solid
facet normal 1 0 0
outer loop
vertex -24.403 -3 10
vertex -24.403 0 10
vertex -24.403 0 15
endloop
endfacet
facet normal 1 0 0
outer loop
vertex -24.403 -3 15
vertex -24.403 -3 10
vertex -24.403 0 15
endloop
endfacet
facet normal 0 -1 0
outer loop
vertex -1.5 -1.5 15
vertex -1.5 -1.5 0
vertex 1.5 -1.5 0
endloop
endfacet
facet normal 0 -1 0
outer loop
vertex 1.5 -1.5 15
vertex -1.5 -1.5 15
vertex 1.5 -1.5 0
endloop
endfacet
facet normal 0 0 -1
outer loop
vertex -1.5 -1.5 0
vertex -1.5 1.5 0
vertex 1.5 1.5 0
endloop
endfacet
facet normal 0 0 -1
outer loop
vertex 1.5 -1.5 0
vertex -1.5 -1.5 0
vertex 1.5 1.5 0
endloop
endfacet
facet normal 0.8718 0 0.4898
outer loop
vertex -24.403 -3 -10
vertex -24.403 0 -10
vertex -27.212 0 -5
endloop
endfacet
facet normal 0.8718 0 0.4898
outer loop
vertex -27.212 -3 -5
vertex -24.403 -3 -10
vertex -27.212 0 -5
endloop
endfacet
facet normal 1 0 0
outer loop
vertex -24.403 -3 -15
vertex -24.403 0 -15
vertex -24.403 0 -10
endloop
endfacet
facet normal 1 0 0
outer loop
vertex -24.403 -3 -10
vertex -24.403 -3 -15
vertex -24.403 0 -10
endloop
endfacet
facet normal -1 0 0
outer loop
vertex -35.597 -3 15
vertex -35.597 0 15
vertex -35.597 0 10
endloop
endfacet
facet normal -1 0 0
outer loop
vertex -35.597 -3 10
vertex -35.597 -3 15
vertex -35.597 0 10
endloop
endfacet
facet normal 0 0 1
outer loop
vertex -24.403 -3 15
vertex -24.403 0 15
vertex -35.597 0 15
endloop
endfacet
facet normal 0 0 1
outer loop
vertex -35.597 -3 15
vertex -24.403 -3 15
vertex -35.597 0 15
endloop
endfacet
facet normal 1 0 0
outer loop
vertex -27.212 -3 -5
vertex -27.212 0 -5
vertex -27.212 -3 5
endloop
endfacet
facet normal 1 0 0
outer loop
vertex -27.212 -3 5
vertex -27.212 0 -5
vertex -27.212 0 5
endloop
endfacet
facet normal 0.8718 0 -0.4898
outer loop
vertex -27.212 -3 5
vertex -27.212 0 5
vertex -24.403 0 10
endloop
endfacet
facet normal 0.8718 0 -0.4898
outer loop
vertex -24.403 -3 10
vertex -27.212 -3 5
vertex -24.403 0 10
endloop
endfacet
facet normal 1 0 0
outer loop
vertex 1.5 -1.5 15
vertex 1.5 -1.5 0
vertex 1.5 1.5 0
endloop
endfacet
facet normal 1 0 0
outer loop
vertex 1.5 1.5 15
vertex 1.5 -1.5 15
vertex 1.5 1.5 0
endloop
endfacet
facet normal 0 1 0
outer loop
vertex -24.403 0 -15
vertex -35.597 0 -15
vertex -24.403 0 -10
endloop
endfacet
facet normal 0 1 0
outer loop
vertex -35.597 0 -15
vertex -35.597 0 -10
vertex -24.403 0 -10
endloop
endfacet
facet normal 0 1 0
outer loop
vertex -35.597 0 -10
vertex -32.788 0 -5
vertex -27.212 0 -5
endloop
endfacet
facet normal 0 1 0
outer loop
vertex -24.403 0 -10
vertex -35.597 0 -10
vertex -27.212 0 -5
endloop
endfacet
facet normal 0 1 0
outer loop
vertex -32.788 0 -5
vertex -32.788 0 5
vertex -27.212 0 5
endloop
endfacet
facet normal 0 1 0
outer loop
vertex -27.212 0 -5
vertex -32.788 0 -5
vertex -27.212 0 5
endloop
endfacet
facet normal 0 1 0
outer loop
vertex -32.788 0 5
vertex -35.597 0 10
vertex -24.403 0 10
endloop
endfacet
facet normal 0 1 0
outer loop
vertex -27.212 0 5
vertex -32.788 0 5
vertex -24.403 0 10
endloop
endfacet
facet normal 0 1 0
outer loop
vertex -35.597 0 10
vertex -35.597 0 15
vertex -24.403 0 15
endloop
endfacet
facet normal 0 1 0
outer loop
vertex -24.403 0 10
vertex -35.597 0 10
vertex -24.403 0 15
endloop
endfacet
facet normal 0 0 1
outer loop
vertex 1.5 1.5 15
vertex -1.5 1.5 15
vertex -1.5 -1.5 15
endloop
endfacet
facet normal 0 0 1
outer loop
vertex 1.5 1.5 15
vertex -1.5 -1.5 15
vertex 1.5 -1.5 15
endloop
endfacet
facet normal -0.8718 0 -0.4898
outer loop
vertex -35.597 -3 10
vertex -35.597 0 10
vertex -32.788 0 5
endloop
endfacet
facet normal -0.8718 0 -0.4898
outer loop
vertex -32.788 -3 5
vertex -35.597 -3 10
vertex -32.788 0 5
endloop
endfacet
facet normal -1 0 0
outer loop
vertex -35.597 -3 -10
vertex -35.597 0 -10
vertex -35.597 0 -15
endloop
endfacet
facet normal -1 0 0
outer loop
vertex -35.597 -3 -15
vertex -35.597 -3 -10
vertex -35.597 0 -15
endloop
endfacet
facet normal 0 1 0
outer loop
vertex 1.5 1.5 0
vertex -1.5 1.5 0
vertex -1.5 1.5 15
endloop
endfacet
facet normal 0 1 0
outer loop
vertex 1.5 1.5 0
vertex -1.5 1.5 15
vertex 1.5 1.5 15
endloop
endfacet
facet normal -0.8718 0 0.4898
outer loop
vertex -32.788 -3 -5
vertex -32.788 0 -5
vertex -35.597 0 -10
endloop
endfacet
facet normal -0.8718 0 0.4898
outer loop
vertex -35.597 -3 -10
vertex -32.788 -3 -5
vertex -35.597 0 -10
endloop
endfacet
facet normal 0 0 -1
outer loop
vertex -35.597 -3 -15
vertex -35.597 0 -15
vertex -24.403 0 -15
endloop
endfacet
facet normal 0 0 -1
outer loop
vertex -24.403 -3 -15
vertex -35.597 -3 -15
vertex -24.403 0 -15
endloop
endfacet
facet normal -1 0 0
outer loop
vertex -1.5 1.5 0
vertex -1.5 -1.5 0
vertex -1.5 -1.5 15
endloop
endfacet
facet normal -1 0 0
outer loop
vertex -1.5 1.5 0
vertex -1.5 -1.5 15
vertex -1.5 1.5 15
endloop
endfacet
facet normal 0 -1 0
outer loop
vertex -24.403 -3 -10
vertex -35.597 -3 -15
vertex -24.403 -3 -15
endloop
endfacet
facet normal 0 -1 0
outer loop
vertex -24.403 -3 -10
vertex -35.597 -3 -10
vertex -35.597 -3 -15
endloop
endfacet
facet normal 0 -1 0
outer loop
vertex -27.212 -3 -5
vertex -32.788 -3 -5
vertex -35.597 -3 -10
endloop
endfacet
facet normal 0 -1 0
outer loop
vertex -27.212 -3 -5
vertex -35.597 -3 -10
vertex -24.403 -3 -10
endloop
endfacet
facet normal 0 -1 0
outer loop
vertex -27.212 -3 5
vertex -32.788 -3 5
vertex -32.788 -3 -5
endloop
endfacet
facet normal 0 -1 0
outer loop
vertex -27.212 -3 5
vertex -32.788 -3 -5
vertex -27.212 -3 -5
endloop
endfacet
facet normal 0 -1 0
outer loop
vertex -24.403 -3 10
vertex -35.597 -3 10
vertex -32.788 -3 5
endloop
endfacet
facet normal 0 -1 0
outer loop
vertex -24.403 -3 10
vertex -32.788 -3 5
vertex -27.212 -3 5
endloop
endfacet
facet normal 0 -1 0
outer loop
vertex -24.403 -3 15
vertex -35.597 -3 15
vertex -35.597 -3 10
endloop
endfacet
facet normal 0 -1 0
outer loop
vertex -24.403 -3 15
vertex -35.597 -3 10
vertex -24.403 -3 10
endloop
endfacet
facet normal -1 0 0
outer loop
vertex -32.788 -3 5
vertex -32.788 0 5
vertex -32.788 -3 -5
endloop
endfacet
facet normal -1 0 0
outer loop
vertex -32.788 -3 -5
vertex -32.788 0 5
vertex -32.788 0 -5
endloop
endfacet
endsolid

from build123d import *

# Parameters (mm, degrees)
F0_W     = 3
F0_H     = 3
F1_DEPTH = 15
F3_DEPTH = 3


with BuildPart() as f1:
    # F0 (on Top) → F1 (new body)
    with BuildSketch(Plane.XY):
        Rectangle(F0_W, F0_H)
    extrude(amount=F1_DEPTH)


with BuildPart() as f3:
    # F2 (on Front) → F3 (new body)
    with BuildSketch(Plane.XZ):
        Polygon((-35.596542, -15), (-24.403458, -15), (-24.403458, -10), (-27.211914, -5), (-27.211914, 5), (-24.403458, 10), (-24.403458, 15), (-35.596542, 15), (-35.596542, 10), (-32.788086, 5), (-32.788086, -5), (-35.596542, -10), align=None)
    extrude(amount=F3_DEPTH)


solid = Compound([f1.part, f3.part])
